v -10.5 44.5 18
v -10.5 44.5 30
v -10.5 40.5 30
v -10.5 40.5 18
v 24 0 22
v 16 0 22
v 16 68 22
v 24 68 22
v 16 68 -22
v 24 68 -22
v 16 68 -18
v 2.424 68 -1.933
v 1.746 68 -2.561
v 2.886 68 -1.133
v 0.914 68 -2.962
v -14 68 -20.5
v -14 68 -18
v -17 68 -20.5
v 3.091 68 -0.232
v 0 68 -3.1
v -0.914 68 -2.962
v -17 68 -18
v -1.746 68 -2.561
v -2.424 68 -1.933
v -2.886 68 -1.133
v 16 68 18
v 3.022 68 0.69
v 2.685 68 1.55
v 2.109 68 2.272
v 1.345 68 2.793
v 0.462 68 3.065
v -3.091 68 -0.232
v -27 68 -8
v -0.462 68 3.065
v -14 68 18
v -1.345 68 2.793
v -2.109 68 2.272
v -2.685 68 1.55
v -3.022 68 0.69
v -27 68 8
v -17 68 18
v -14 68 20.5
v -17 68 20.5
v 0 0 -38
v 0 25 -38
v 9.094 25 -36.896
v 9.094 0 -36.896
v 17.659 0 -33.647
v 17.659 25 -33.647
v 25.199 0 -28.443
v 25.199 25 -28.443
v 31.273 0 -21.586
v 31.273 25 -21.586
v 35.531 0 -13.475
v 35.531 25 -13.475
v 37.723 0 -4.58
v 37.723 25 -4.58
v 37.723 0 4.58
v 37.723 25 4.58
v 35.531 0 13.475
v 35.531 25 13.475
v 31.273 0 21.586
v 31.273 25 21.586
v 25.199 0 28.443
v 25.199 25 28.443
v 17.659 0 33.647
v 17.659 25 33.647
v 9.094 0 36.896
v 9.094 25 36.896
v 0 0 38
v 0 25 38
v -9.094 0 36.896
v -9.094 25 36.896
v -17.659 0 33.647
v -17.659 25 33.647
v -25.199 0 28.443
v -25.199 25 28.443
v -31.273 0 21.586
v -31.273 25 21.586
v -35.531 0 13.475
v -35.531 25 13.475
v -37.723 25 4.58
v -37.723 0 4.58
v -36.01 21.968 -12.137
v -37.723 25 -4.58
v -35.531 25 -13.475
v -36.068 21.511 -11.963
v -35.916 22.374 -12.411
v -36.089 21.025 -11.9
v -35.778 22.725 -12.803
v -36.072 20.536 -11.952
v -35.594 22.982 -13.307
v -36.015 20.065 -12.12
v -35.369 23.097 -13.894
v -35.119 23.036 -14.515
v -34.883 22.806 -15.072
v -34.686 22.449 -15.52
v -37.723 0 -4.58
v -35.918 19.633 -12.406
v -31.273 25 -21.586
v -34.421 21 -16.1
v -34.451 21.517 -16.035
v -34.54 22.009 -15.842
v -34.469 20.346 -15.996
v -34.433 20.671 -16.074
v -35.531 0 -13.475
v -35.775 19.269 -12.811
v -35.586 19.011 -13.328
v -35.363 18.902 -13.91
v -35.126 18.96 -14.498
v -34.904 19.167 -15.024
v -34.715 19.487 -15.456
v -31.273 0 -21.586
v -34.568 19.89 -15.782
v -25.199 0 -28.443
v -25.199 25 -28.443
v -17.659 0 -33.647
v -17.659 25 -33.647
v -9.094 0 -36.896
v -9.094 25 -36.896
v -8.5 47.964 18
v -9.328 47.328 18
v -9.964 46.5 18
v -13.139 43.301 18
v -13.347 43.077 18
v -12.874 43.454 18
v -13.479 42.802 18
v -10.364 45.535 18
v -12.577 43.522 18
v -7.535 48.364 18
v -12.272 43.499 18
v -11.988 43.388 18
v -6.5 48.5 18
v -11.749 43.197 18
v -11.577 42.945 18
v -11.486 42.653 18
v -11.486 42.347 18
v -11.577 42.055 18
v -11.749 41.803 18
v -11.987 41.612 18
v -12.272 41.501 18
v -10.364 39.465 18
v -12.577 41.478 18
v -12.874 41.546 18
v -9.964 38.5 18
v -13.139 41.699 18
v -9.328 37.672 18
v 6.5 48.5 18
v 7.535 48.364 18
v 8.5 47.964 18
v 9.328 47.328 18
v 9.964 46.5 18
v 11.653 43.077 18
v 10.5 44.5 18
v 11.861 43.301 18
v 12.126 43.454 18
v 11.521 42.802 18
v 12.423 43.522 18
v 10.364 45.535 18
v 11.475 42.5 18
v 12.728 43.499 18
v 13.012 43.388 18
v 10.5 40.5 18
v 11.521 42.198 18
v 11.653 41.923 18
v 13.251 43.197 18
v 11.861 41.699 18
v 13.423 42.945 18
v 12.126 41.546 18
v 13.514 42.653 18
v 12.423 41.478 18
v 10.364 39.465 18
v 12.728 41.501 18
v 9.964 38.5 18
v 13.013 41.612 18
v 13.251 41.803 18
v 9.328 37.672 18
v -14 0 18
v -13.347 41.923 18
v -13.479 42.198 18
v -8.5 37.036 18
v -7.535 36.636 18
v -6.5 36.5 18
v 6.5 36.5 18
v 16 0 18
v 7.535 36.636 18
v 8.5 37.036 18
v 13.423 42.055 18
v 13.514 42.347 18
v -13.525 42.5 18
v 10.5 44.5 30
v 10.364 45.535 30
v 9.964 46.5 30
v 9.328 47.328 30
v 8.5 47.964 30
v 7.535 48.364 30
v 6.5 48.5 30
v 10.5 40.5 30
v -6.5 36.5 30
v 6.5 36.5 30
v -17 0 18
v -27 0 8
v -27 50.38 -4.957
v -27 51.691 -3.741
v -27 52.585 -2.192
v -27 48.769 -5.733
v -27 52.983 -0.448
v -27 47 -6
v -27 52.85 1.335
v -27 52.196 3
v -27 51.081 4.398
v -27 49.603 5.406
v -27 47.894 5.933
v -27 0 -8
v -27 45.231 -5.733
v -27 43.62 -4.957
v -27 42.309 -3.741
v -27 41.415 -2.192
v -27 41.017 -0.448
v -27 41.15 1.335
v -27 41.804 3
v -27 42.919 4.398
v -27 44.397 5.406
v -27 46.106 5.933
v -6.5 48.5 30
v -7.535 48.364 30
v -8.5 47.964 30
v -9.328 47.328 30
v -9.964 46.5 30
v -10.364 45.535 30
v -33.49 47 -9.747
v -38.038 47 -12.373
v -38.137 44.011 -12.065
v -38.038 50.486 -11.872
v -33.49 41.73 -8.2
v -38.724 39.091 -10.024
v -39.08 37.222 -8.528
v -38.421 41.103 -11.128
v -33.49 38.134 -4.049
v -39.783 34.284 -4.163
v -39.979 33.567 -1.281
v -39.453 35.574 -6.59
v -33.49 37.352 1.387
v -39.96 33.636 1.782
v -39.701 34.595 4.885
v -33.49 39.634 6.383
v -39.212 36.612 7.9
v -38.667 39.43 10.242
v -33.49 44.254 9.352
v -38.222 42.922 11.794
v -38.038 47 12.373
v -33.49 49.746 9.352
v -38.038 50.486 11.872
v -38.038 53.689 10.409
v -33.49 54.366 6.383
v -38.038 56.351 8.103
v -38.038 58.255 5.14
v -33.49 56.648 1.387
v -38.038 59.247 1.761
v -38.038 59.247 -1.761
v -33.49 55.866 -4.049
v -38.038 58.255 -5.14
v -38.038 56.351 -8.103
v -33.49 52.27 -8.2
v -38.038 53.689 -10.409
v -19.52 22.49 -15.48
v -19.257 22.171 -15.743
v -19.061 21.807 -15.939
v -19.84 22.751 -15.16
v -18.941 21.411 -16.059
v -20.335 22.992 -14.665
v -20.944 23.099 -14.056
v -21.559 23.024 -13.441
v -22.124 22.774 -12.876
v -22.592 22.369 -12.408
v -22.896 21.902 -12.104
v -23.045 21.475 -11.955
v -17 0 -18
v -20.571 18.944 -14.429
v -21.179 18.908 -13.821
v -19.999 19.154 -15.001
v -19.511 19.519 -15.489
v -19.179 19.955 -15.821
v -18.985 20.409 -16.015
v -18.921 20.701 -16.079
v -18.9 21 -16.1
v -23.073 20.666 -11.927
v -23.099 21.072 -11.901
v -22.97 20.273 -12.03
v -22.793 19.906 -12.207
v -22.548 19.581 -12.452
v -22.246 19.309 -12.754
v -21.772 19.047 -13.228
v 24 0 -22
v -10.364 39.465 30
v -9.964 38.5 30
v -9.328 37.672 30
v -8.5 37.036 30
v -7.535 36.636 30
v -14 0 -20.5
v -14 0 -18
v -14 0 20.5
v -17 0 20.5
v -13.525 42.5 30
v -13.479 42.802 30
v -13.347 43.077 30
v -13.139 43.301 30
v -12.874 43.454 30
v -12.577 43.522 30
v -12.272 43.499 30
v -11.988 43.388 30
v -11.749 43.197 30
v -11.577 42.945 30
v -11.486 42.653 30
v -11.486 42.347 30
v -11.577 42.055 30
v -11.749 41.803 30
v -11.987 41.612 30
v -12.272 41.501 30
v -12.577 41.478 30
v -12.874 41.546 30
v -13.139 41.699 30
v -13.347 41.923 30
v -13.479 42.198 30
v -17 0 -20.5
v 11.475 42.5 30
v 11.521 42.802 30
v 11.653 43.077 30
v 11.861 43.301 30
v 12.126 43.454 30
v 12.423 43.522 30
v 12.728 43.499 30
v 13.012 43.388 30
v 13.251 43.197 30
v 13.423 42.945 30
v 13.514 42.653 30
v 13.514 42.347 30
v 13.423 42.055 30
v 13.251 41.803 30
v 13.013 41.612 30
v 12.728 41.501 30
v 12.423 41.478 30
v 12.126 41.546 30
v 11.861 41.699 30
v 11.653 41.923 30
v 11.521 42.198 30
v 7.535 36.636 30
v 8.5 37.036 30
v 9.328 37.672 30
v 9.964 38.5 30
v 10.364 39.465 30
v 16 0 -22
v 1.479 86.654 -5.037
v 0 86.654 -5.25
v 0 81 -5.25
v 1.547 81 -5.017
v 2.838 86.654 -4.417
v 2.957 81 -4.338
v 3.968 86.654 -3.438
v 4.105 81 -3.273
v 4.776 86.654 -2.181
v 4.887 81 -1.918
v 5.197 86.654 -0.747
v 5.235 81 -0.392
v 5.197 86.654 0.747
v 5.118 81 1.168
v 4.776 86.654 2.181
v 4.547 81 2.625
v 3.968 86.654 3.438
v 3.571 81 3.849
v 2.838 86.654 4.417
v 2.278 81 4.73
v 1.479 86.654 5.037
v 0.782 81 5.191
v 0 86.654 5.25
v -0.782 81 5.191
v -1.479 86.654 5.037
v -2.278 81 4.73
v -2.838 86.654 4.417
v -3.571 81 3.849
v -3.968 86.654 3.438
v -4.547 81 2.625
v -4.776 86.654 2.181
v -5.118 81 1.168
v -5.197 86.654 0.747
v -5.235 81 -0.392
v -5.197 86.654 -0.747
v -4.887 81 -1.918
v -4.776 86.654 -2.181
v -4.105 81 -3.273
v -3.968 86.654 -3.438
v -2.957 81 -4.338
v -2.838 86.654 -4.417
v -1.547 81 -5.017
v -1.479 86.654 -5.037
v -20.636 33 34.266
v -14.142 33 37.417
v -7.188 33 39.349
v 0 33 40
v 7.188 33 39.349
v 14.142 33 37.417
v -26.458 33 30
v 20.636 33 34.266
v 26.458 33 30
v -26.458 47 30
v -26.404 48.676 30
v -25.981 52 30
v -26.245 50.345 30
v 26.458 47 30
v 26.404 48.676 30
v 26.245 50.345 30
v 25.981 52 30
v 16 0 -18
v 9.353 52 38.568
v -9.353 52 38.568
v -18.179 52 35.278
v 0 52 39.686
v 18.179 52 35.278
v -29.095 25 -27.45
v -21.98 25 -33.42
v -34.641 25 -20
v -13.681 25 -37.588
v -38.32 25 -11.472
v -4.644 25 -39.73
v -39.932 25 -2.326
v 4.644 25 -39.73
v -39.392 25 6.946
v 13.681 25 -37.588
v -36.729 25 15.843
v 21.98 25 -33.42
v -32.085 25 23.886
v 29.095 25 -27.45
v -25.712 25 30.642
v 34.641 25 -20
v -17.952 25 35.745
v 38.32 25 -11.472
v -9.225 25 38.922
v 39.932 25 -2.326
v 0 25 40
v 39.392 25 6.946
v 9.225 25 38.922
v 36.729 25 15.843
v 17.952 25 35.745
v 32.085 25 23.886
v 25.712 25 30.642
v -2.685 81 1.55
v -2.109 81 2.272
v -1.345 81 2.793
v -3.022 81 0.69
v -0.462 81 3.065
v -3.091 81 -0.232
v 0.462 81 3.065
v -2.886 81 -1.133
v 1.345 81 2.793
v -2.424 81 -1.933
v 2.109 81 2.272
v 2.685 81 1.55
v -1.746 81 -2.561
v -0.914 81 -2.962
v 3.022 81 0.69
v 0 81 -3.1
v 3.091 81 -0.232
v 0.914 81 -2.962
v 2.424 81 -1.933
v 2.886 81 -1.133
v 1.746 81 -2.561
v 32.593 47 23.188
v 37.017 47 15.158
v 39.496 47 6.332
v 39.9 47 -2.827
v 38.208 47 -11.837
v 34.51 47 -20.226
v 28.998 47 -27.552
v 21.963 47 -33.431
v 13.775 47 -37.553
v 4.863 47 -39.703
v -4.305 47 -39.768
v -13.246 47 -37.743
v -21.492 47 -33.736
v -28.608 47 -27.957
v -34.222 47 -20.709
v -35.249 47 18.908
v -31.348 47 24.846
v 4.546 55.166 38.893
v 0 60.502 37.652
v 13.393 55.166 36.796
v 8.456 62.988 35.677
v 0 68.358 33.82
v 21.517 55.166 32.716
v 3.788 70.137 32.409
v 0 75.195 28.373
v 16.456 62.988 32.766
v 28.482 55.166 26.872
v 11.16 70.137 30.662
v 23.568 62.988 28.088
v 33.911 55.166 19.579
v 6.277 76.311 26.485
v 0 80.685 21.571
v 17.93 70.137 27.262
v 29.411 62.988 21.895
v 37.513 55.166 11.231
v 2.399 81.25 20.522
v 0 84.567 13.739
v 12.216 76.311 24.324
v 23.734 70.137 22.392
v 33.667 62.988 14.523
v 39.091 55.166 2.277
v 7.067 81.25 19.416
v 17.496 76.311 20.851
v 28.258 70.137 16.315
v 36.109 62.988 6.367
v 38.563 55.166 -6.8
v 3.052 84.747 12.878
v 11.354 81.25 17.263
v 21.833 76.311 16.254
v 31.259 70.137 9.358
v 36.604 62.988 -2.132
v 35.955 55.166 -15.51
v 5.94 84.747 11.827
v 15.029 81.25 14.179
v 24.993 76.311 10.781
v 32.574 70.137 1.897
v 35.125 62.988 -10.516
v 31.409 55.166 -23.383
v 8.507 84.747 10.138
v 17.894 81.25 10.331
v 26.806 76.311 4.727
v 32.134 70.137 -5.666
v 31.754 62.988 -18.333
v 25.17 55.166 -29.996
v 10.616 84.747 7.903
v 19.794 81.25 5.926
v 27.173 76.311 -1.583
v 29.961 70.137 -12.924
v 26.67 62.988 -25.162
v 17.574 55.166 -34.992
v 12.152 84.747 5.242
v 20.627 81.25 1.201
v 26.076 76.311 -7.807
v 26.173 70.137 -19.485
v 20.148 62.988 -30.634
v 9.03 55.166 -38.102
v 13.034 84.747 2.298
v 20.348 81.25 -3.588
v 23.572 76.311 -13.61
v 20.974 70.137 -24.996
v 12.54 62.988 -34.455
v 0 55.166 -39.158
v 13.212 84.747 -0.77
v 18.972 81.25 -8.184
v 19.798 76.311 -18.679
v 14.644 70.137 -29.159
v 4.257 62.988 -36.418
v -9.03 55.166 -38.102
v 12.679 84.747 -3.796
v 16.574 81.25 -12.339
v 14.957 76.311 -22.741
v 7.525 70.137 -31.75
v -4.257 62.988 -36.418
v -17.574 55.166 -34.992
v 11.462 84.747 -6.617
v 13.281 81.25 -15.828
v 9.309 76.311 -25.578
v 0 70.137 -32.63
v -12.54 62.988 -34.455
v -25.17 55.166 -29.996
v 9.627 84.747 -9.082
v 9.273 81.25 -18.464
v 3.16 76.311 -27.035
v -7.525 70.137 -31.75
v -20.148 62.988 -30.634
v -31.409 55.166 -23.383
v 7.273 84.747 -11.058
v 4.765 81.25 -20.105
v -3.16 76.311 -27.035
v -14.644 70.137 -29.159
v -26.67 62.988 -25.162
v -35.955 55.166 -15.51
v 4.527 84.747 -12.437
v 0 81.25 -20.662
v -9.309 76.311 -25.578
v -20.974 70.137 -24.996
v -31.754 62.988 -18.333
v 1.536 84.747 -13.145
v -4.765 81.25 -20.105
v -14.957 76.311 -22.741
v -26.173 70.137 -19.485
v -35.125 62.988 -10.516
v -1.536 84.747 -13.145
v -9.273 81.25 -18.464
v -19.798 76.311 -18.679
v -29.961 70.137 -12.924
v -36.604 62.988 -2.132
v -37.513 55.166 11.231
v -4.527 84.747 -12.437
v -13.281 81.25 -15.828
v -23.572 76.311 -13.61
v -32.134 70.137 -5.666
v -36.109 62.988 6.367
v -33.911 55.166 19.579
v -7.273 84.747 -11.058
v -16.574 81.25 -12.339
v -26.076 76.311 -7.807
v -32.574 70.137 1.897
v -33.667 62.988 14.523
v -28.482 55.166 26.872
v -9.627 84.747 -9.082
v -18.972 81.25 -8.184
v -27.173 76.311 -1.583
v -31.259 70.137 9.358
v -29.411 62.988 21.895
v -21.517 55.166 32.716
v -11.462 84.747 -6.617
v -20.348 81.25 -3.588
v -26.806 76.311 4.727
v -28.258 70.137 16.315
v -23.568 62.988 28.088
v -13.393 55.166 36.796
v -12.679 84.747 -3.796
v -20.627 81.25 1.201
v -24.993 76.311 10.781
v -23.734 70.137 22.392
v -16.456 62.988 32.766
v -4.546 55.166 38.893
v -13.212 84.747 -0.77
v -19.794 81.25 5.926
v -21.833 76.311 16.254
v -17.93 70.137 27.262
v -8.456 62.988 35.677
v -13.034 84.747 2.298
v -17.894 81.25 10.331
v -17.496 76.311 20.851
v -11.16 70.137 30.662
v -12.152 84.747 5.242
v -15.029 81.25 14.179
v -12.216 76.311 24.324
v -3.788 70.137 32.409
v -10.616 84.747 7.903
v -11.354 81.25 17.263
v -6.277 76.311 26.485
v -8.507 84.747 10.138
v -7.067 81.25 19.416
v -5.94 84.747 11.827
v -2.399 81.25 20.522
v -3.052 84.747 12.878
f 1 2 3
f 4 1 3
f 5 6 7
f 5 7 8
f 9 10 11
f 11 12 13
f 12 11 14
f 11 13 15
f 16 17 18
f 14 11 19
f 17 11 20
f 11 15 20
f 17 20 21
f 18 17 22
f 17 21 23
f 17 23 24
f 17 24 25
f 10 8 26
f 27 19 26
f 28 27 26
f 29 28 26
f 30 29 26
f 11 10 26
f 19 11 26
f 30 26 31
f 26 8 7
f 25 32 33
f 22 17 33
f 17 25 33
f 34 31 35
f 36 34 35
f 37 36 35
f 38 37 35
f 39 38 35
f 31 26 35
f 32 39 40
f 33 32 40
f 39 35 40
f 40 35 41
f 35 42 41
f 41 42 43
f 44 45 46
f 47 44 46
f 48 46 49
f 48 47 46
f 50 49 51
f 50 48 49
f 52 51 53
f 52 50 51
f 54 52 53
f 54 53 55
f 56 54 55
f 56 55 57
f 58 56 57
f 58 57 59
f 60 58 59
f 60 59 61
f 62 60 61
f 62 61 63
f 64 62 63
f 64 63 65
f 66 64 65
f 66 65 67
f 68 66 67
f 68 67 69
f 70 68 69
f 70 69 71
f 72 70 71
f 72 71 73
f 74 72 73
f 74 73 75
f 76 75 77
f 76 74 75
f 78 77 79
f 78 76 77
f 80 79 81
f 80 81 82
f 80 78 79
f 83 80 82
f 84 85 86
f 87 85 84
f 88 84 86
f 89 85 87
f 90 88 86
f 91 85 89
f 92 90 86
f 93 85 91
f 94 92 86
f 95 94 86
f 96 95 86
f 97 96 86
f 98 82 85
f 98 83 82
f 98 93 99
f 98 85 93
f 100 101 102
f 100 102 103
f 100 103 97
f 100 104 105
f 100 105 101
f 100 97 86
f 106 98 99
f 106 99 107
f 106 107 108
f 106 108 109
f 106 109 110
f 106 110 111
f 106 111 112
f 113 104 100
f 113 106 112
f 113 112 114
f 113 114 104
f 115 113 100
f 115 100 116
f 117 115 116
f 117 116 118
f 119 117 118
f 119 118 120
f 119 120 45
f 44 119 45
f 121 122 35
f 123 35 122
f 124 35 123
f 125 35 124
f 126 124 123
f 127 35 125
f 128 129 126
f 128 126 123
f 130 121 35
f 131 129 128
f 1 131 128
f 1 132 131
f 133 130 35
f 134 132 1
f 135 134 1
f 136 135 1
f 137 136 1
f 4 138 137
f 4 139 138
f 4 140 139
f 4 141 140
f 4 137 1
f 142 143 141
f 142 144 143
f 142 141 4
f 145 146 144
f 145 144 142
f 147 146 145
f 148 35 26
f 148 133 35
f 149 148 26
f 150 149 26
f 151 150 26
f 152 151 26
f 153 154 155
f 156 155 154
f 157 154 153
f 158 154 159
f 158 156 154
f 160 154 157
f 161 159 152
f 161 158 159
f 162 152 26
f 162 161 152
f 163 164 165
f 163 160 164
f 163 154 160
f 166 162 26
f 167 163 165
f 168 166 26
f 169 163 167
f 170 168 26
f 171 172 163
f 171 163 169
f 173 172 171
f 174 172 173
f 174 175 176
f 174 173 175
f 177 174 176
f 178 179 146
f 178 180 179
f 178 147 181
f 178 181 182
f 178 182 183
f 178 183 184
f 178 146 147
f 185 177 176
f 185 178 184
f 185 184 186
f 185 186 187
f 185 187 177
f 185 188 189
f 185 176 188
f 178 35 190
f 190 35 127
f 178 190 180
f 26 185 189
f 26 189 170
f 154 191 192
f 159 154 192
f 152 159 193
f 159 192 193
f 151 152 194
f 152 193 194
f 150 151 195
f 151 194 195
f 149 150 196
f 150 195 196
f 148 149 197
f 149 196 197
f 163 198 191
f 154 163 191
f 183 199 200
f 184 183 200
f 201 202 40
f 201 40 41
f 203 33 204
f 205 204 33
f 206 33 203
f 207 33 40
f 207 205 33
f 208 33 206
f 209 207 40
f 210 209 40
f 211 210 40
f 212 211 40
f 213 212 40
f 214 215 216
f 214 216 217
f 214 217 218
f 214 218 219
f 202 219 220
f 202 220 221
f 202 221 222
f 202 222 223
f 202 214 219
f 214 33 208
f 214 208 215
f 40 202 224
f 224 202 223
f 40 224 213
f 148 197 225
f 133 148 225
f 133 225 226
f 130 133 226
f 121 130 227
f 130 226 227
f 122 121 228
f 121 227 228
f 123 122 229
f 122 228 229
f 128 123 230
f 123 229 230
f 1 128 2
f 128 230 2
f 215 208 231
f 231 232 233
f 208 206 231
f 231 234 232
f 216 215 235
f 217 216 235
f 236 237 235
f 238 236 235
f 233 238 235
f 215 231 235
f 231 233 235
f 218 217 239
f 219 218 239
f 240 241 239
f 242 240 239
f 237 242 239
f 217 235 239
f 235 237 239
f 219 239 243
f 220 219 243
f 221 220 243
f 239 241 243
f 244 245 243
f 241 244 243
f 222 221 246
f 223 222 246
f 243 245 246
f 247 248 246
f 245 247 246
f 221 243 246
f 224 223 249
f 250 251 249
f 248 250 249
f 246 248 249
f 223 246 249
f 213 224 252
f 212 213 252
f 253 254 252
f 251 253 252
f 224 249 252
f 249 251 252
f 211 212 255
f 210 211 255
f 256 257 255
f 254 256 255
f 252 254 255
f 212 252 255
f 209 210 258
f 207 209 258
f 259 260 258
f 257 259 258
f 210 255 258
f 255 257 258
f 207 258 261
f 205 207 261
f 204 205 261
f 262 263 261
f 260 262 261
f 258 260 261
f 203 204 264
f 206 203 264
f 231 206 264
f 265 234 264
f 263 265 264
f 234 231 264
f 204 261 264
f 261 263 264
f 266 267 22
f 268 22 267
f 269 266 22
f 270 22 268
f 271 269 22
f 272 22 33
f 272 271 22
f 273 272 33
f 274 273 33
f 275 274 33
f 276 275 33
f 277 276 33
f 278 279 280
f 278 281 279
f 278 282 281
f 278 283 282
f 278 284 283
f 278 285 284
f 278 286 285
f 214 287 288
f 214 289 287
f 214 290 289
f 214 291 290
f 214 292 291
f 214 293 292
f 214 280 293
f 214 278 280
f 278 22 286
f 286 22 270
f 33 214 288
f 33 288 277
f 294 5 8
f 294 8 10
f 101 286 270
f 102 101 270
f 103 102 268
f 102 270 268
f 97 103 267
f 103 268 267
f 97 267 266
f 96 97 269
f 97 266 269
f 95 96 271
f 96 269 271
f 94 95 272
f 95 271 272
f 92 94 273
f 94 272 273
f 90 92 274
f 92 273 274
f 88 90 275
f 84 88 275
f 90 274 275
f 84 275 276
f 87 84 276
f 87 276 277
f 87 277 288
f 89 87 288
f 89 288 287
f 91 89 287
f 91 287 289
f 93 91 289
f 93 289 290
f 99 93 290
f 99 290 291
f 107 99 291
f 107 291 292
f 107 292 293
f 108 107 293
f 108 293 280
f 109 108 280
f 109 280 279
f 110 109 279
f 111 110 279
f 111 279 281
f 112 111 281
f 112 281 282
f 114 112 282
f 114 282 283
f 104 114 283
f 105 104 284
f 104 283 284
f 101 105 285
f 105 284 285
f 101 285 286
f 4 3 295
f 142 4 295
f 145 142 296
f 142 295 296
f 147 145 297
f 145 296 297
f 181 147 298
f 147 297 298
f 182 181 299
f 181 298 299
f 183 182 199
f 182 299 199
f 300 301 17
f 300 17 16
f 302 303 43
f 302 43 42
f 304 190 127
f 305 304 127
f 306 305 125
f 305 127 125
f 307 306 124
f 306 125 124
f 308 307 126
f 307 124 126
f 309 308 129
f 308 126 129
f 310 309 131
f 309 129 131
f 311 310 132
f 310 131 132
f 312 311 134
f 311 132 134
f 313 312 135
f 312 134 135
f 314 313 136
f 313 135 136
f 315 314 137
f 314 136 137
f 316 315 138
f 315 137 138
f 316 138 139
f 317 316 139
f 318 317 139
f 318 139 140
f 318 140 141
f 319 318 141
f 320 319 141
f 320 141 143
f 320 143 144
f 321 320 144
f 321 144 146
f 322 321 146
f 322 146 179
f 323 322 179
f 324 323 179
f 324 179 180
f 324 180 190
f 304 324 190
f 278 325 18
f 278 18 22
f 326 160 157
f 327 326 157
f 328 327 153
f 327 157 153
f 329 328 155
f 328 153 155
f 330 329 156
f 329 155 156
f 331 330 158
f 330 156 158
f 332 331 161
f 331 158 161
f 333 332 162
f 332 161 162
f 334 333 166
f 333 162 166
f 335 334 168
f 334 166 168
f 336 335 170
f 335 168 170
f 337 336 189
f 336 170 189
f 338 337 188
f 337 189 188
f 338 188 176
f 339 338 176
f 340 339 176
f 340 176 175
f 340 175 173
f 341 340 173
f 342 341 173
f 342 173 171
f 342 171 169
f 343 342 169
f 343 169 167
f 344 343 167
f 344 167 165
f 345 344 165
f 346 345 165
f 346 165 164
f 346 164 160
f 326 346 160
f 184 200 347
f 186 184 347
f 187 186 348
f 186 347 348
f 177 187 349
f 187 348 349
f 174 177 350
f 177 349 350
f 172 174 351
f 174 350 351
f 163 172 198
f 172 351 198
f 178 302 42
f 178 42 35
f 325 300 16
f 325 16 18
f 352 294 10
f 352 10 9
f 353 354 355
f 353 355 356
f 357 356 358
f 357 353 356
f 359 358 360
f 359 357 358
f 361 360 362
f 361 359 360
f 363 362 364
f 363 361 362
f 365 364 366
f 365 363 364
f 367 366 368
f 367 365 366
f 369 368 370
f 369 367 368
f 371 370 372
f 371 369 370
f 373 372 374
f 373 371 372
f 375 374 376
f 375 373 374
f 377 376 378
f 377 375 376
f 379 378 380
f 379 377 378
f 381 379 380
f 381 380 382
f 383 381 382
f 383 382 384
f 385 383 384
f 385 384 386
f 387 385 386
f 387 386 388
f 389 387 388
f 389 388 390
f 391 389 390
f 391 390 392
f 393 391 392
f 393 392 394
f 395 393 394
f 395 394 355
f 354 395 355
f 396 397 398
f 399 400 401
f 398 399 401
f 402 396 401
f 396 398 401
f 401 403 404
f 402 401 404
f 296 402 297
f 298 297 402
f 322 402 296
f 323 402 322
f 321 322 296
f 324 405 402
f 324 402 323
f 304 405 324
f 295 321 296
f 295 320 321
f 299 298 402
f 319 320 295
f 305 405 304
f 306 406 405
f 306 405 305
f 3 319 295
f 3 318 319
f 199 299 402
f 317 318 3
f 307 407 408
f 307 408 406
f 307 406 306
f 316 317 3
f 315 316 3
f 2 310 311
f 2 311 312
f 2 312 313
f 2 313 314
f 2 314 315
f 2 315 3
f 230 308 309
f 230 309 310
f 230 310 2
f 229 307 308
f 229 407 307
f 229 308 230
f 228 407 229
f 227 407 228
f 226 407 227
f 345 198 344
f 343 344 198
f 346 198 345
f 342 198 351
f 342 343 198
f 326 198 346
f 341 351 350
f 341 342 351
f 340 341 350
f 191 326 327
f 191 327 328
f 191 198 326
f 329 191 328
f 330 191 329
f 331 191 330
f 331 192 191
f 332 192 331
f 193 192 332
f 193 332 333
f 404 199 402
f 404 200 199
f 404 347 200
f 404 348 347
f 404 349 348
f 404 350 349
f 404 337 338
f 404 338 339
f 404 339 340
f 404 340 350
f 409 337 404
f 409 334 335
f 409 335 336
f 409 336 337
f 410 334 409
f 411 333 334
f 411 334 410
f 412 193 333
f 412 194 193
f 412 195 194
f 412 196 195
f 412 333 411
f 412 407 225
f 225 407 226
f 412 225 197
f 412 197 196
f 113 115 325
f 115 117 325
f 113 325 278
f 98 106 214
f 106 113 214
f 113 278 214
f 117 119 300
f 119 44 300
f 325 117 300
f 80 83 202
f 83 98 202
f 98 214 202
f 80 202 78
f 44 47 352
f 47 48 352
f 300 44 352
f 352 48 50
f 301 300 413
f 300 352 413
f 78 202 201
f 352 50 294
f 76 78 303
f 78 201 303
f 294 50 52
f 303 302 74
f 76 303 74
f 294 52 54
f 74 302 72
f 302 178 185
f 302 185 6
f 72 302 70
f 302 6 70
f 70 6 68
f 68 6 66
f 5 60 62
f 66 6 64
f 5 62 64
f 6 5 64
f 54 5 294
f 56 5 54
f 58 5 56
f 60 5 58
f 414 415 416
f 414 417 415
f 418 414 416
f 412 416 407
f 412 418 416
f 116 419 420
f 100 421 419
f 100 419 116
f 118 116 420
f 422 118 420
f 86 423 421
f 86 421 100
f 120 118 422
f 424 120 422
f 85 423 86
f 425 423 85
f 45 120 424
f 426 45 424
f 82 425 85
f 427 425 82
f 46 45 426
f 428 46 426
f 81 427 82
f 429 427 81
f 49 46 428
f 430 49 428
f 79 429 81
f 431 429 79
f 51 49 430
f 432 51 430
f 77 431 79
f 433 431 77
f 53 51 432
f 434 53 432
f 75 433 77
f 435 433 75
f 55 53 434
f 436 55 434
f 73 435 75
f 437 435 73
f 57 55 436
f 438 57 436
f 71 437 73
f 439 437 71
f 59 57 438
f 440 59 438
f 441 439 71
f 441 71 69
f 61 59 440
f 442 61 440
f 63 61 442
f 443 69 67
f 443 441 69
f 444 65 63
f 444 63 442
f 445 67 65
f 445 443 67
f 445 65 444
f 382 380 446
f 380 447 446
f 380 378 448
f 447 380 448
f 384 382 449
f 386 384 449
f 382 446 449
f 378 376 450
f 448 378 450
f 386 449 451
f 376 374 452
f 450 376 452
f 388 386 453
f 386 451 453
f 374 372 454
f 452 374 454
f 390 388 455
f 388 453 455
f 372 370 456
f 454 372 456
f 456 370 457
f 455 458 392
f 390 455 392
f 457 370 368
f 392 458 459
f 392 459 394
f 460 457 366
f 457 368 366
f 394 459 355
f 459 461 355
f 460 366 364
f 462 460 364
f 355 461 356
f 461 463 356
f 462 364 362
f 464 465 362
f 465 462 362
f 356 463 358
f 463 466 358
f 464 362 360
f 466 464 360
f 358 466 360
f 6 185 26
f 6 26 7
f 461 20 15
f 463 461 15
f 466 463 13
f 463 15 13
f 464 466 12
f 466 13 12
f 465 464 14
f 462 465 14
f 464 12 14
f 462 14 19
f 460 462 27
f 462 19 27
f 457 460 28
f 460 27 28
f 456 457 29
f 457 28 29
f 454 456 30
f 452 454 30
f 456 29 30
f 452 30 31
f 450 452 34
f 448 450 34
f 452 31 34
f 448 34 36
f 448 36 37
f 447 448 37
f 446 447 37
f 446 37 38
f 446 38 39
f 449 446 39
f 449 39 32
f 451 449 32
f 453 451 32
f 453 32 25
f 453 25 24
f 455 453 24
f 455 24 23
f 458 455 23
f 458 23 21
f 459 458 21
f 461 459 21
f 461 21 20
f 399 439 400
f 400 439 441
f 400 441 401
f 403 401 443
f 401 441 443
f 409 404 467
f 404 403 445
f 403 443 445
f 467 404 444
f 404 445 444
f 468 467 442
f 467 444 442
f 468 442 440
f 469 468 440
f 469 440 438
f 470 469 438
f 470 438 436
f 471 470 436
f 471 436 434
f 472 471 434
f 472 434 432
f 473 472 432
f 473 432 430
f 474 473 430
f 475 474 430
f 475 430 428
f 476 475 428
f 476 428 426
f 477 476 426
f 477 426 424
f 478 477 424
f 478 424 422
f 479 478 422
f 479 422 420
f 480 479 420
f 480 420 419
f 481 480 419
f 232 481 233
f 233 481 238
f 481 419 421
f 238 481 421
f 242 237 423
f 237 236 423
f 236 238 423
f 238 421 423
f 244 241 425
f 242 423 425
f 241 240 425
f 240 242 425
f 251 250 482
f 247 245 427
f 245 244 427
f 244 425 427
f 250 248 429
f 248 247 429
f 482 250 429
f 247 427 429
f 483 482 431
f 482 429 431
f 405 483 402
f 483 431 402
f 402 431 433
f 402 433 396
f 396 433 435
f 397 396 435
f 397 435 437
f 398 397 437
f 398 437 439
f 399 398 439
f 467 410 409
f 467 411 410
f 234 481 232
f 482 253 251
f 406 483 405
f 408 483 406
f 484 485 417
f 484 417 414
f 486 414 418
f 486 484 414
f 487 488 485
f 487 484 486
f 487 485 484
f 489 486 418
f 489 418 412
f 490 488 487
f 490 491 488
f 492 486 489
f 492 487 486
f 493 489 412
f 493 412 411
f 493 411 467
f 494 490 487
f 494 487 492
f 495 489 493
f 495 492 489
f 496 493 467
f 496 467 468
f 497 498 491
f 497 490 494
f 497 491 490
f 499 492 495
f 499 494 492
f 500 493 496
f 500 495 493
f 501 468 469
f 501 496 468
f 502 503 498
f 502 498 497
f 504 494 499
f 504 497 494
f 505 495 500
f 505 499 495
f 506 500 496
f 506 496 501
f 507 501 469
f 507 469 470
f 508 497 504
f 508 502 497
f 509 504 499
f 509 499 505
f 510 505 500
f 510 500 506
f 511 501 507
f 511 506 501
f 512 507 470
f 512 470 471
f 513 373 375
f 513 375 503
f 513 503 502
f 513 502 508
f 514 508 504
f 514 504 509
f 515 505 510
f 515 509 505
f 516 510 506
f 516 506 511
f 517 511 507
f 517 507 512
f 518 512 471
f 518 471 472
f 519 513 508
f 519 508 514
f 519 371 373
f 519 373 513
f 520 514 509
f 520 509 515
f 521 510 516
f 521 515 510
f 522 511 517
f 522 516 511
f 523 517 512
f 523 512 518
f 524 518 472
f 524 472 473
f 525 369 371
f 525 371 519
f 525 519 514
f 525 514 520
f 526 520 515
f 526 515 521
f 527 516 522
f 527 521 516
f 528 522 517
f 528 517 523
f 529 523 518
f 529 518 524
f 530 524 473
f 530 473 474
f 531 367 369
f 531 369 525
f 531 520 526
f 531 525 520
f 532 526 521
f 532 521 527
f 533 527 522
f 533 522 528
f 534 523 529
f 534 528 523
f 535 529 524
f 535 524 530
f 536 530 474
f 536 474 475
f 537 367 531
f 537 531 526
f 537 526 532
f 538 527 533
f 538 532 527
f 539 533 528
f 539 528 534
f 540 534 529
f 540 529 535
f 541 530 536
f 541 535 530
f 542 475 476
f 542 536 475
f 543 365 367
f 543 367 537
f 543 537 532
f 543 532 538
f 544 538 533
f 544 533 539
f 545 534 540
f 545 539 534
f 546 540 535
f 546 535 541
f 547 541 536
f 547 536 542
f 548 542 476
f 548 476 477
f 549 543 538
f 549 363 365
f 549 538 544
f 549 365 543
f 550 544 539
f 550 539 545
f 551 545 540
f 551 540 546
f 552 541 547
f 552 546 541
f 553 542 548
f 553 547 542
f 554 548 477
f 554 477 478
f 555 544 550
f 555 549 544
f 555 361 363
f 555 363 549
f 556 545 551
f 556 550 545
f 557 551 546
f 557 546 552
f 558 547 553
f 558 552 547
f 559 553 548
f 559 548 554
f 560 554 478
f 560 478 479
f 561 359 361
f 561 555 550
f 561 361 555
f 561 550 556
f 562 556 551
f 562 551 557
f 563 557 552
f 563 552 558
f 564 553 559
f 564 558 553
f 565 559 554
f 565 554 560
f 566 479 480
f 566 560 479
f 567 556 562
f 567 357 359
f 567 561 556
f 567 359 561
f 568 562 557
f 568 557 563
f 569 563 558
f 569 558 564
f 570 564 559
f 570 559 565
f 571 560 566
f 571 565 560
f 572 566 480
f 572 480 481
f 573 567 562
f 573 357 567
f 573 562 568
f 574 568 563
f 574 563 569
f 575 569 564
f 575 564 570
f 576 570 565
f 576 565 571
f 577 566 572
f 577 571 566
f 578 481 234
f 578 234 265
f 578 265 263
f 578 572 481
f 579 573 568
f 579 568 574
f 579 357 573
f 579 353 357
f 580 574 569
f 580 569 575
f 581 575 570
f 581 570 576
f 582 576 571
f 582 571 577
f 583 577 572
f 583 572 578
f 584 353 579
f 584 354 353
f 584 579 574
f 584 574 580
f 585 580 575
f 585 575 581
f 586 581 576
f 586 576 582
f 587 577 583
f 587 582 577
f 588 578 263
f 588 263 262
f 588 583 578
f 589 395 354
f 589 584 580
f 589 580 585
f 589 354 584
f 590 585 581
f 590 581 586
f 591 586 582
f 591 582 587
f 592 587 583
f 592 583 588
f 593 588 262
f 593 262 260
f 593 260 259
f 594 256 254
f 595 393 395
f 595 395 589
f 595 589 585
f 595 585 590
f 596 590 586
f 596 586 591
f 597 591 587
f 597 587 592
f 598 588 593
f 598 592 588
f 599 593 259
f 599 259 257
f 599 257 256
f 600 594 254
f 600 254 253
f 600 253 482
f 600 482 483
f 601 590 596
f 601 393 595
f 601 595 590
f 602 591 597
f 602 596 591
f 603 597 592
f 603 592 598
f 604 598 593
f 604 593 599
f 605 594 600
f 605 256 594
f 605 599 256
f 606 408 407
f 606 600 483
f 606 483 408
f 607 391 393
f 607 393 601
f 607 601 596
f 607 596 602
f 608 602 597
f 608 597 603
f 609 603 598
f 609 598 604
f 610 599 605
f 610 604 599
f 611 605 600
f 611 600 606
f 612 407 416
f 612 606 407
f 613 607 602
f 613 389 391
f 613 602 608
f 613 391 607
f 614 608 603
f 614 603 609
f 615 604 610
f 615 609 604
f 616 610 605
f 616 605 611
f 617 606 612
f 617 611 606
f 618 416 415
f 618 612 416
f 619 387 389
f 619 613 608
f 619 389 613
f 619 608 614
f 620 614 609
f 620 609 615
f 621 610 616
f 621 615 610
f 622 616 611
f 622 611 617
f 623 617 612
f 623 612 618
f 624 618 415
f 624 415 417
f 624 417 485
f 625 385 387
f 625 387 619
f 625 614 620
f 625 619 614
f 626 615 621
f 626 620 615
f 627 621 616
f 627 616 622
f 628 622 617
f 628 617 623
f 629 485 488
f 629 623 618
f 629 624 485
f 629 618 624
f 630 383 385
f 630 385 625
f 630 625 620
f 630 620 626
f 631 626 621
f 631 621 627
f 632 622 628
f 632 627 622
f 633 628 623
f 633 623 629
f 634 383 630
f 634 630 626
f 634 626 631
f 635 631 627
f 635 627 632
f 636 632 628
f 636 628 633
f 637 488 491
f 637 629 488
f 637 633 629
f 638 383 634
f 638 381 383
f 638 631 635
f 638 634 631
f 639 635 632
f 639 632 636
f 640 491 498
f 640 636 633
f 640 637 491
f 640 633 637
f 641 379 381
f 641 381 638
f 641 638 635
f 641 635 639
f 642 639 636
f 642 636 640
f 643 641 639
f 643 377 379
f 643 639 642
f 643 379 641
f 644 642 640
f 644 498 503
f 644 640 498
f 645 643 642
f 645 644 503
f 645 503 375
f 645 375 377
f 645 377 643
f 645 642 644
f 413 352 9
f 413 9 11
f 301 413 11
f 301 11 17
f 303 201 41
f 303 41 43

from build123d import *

# Parameters (mm, degrees)
ESQUISSE1_R                  = 40
BOSS_EXTRU_1_DEPTH           = 87
CONG_1_R                     = 40
ESQUISSE2_OUTSIDE_W          = 110.544
ESQUISSE2_OUTSIDE_H          = 110.544
ESQUISSE2_OUTSIDE_R          = 38
ENL_V_MAT_EXTRU_1_DEPTH      = 25
ENL_V_START                  = 40
ESQUISSE3_W                  = 76
ESQUISSE3_H                  = 19
ENL_V_MAT_EXTRU_2_DEPTH      = 10
ENL_V_MAT_EXTRU_3_DEPTH      = 20
ENL_V_MAT_EXTRU_4_DEPTH      = 68
ENL_V_MAT_EXTRU_5_REACH      = 21
ENL_V_MAT_EXTRU_5_END_RADIUS = 40
ESQUISSE6_R                  = 3.1
ESQUISSE8_R                  = 5.25
ENL_V_MAT_EXTRU_6_DEPTH      = 6
TROU_TARAUD_M2_51_D          = 2.05
TROU_TARAUD_M2_51_DEPTH      = 12
TROU_TARAUD_M51_REACH        = 25
TROU_TARAUD_M51_BORE_R       = 2.1


with BuildPart() as part:
    # Esquisse1 → Boss.-Extru.1 (new body)
    with BuildSketch(Plane(origin=(0, 0, 0), x_dir=(1, 0, 0), z_dir=(0, 1, 0))):
        with Locations(Location((0, 0, 0), (0, 0, 270))):  # turned: the seam where the file's is
            Circle(ESQUISSE1_R)
    extrude(amount=BOSS_EXTRU_1_DEPTH)

    # Congé1
    cong_1_edges = [part.edges().sort_by_distance(p)[0] for p in [
        (0, 87, -40),
    ]]
    fillet(cong_1_edges, radius=CONG_1_R)

    # Esquisse2 outside → Enlèv. mat.-Extru.1 (cut)
    with BuildSketch(Plane.XZ):
        Rectangle(ESQUISSE2_OUTSIDE_W, ESQUISSE2_OUTSIDE_H)
        with Locations(Location((0, 0, 0), (0, 0, 270))):  # turned: the seam where the file's is
            Circle(ESQUISSE2_OUTSIDE_R, mode=Mode.SUBTRACT)
    extrude(amount=-ENL_V_MAT_EXTRU_1_DEPTH, mode=Mode.SUBTRACT)

    # Esquisse3 → Enlèv. mat.-Extru.2 (cut)
    with BuildSketch(Plane.XY.offset(ENL_V_START)):
        with Locations((0, 42.5)):
            Rectangle(ESQUISSE3_W, ESQUISSE3_H)
    extrude(amount=-ENL_V_MAT_EXTRU_2_DEPTH, mode=Mode.SUBTRACT)

    # Esquisse4 → Enlèv. mat.-Extru.3 (cut)
    with BuildSketch(Plane.XY.offset(30)):
        with BuildLine():
            Line((-6.5, 36.5), (6.5, 36.5))
            ThreePointArc((6.5, 36.5), (9.328427125, 37.671572875), (10.5, 40.5))
            Line((10.5, 40.5), (10.5, 44.5))
            ThreePointArc((10.5, 44.5), (9.328427125, 47.328427125), (6.5, 48.5))
            Line((6.5, 48.5), (-6.5, 48.5))
            ThreePointArc((-6.5, 48.5), (-9.328427125, 47.328427125), (-10.5, 44.5))
            Line((-10.5, 44.5), (-10.5, 40.5))
            ThreePointArc((-10.5, 40.5), (-9.328427125, 37.671572875), (-6.5, 36.5))
        make_face()
    extrude(amount=-ENL_V_MAT_EXTRU_3_DEPTH, mode=Mode.SUBTRACT)

    # Esquisse5 → Enlèv. mat.-Extru.4 (cut)
    with BuildSketch(Plane.XZ):
        Polygon((-14, 18), (16, 18), (16, 22), (24, 22), (24, -22), (16, -22), (16, -18), (-14, -18), (-14, -20.5), (-17, -20.5), (-17, -18), (-27, -8), (-27, 8), (-17, 18), (-17, 20.5), (-14, 20.5), align=None)
    extrude(amount=-ENL_V_MAT_EXTRU_4_DEPTH, mode=Mode.SUBTRACT)

    # Enlèv. mat.-Extru.5: up to this sphere (the profile starts inside it)
    enl_v_mat_extru_5_end = Location((0, 47, 0)) * Sphere(ENL_V_MAT_EXTRU_5_END_RADIUS, mode=Mode.PRIVATE)
    # Esquisse6 → Enlèv. mat.-Extru.5 (cut, up to the surface)
    with BuildSketch(Plane.XZ.offset(-68), mode=Mode.PRIVATE) as enl_v_mat_extru_5_sk1:
        with Locations(Location((0, 0, 0), (0, 0, 270))):  # turned: the seam where the file's is
            Circle(ESQUISSE6_R)
    enl_v_mat_extru_5_tool1 = extrude(enl_v_mat_extru_5_sk1.sketch, amount=-ENL_V_MAT_EXTRU_5_REACH, mode=Mode.PRIVATE) & enl_v_mat_extru_5_end
    add(enl_v_mat_extru_5_tool1.solids().sort_by_distance((0, 68, 0))[0], mode=Mode.SUBTRACT)

    # Esquisse8 → Enlèv. mat.-Extru.6 (cut)
    with BuildSketch(Plane.XZ.offset(-87)):
        with Locations(Location((0, 0, 0), (0, 0, 270))):  # turned: the seam where the file's is
            Circle(ESQUISSE8_R)
    extrude(amount=ENL_V_MAT_EXTRU_6_DEPTH, mode=Mode.SUBTRACT)

    # Esquisse11 → Enlèvement de matière-Révolution1 (revolve, cut)
    with BuildSketch(Plane.XY, mode=Mode.PRIVATE) as enl_vement_de_mati_re_r_volution1_sk:
        Polygon((-27, 47), (-27, 41), (-45, 30.607695155), (-45, 47), align=None)
    revolve(enl_vement_de_mati_re_r_volution1_sk.sketch.rotate(Axis((-27, 47, 0), (-1, 0, 0)), 270), axis=Axis((-27, 47, 0), (-1, 0, 0)), mode=Mode.SUBTRACT)  # turned: the seam where the file's is

    # Trou taraudé M2.51
    with Locations(Plane.XY.offset(30)):
        with Locations((-12.5, 42.5), (12.5, 42.5)):
            Hole(TROU_TARAUD_M2_51_D / 2, depth=TROU_TARAUD_M2_51_DEPTH)

    # Trou taraudé M51 bore → Trou taraudé M51 (cut, up to next)
    with BuildSketch(Plane(origin=(-17, 0, 0), x_dir=(0, 0, -1), z_dir=(1, 0, 0)), mode=Mode.PRIVATE) as trou_taraud_m51_sk1:
        with Locations((14, 21)):
            Circle(TROU_TARAUD_M51_BORE_R)
    trou_taraud_m51_tool1 = extrude(trou_taraud_m51_sk1.sketch, amount=-TROU_TARAUD_M51_REACH, mode=Mode.PRIVATE) & part.part
    add(trou_taraud_m51_tool1.solids().sort_by_distance((-17, 21, -14))[0], mode=Mode.SUBTRACT)


solid = part.part
